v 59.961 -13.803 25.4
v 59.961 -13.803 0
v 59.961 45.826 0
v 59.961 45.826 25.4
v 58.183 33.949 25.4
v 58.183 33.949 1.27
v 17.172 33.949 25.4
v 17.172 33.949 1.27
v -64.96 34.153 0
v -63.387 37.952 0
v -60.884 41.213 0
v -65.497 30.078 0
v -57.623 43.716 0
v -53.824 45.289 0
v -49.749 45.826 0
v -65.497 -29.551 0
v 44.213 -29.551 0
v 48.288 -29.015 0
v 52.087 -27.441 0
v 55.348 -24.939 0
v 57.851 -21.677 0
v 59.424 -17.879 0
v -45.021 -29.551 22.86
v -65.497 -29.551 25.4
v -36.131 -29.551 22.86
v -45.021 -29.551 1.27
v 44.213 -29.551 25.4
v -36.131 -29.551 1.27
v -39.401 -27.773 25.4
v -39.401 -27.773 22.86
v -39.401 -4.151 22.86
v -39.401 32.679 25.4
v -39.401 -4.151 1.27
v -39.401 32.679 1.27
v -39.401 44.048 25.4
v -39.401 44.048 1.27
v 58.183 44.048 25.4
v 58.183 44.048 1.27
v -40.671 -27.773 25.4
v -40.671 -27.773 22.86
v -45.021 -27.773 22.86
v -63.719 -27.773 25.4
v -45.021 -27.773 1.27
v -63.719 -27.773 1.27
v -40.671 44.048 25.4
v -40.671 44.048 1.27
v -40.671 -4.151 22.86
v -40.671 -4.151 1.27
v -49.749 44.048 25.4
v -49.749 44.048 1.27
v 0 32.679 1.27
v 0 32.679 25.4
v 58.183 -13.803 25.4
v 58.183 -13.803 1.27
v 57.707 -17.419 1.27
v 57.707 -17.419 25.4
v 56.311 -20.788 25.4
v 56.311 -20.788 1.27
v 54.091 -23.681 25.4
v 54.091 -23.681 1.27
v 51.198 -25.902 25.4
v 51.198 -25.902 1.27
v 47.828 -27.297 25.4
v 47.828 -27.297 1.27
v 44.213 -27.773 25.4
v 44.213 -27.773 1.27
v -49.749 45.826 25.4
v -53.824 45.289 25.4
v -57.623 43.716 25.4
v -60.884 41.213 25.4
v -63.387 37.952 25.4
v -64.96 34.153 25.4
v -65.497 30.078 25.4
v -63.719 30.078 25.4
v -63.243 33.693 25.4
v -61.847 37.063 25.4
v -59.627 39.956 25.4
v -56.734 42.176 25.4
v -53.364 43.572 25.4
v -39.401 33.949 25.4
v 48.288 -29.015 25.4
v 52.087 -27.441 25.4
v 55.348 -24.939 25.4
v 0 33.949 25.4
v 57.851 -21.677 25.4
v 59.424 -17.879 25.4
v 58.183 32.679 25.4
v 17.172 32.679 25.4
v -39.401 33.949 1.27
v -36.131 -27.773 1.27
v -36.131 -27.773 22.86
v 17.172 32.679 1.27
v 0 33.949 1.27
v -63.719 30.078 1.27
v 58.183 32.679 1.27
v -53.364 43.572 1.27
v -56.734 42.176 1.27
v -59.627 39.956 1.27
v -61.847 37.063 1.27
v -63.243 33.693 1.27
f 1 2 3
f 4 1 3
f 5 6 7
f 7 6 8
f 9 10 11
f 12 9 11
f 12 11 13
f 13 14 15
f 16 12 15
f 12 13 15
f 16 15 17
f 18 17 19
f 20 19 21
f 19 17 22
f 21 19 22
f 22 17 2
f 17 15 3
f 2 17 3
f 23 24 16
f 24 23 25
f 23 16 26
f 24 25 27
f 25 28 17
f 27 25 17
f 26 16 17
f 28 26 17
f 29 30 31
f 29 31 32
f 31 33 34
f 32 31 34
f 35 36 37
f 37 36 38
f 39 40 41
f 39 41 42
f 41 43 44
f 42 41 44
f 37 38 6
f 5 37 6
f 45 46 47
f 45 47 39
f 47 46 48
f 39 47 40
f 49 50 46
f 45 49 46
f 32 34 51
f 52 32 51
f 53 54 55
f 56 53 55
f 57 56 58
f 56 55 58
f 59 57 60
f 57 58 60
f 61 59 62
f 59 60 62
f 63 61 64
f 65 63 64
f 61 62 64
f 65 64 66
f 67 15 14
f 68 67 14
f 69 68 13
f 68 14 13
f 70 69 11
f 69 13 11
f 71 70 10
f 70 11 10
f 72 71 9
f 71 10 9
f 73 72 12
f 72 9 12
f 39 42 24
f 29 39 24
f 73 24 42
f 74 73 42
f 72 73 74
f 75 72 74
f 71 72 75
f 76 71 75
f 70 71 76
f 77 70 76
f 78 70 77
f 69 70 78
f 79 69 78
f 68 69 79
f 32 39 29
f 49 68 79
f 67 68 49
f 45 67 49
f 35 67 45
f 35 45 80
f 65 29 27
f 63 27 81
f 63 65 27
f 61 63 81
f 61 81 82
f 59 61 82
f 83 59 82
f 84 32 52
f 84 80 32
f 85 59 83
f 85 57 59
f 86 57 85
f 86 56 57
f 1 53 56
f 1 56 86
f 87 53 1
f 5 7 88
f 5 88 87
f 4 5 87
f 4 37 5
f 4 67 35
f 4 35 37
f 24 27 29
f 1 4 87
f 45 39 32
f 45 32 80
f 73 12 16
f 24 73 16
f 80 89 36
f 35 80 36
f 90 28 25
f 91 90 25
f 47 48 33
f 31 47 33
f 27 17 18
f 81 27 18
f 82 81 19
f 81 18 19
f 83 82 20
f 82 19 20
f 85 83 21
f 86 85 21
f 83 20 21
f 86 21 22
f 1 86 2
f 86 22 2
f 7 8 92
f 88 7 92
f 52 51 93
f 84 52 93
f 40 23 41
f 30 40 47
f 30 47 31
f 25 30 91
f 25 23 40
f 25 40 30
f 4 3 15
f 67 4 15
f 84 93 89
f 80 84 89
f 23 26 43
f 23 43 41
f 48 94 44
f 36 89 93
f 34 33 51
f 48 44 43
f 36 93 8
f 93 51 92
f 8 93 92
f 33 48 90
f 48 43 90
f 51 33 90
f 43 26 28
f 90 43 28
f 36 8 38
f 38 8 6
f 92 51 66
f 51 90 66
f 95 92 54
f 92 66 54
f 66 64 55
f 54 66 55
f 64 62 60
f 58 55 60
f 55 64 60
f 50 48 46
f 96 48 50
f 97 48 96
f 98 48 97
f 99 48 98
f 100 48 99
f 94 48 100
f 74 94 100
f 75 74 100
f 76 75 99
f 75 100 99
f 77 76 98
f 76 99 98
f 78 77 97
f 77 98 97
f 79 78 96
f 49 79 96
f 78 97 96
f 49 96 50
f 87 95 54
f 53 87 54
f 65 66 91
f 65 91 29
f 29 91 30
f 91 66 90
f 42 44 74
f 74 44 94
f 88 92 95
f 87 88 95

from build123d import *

# Parameters (mm, degrees)
F1_DEPTH = 25.4
F2_DEPTH = 1.27
F3_W     = 8.89
F3_H     = 21.59
F4_DEPTH = 25.4


with BuildPart() as f1:
    # F0 (on Top) → F1 (new body)
    with BuildSketch(Plane.XY):
        with BuildLine():
            Line((59.960537, 45.825542), (-49.74861, 45.825542))
            ThreePointArc((-49.74861, 45.825542), (-60.884126, 41.21306), (-65.496609, 30.077543))
            Line((-65.496609, 30.077543), (-65.496609, -29.551196))
            Line((-65.496609, -29.551196), (44.212538, -29.551196))
            ThreePointArc((44.212538, -29.551196), (55.348055, -24.938714), (59.960537, -13.803197))
            Line((59.960537, -13.803197), (59.960537, 45.825542))
        make_face()
        with BuildLine():
            ThreePointArc((-63.71861, 30.077543), (-59.626891, 39.955824), (-49.74861, 44.047543))
            Line((-49.74861, 44.047543), (-40.670957, 44.047543))
            Line((-40.670957, 44.047543), (-40.670957, -27.773197))
            Line((-40.670957, -27.773197), (-63.71861, -27.773197))
            Line((-63.71861, -27.773197), (-63.71861, 30.077543))
        make_face(mode=Mode.SUBTRACT)
        with BuildLine():
            Line((-39.400957, 44.047543), (58.182538, 44.047543))
            Line((58.182538, 44.047543), (58.182538, 33.949472))
            Line((58.182538, 33.949472), (17.172182, 33.949472))
            Line((17.172182, 33.949472), (17.172182, 32.679472))
            Line((17.172182, 32.679472), (58.182538, 32.679472))
            Line((58.182538, 32.679472), (58.182538, -13.803197))
            ThreePointArc((58.182538, -13.803197), (54.090819, -23.681479), (44.212538, -27.773197))
            Line((44.212538, -27.773197), (-39.400957, -27.773197))
            Line((-39.400957, -27.773197), (-39.400957, 32.679472))
            Line((-39.400957, 32.679472), (0, 32.679472))
            Line((0, 32.679472), (0, 33.949472))
            Line((0, 33.949472), (-39.400957, 33.949472))
            Line((-39.400957, 33.949472), (-39.400957, 44.047543))
        make_face(mode=Mode.SUBTRACT)
    extrude(amount=F1_DEPTH)

    # F0 (on Top) → F2 (join)
    with BuildSketch(Plane.XY):
        with BuildLine():
            Line((-40.670957, 44.047543), (-49.74861, 44.047543))
            ThreePointArc((-49.74861, 44.047543), (-59.626891, 39.955824), (-63.71861, 30.077543))
            Line((-63.71861, 30.077543), (-63.71861, -27.773197))
            Line((-63.71861, -27.773197), (-40.670957, -27.773197))
            Line((-40.670957, -27.773197), (-40.670957, 44.047543))
        make_face()
        with BuildLine():
            Line((58.182538, 33.949472), (58.182538, 44.047543))
            Line((58.182538, 44.047543), (-39.400957, 44.047543))
            Line((-39.400957, 44.047543), (-39.400957, 33.949472))
            Line((-39.400957, 33.949472), (0, 33.949472))
            Line((0, 33.949472), (0, 32.679472))
            Line((0, 32.679472), (-39.400957, 32.679472))
            Line((-39.400957, 32.679472), (-39.400957, -27.773197))
            Line((-39.400957, -27.773197), (44.212538, -27.773197))
            ThreePointArc((44.212538, -27.773197), (54.090819, -23.681479), (58.182538, -13.803197))
            Line((58.182538, -13.803197), (58.182538, 32.679472))
            Line((58.182538, 32.679472), (17.172182, 32.679472))
            Line((17.172182, 32.679472), (17.172182, 33.949472))
            Line((17.172182, 33.949472), (58.182538, 33.949472))
        make_face()
    extrude(amount=F2_DEPTH)

    # F3 (on face) → F4 (cut)
    with BuildSketch(Plane.XZ.offset(29.551196)):
        with Locations((-40.575533, 12.065)):
            Rectangle(F3_W, F3_H)
    extrude(amount=-F4_DEPTH, mode=Mode.SUBTRACT)


solid = f1.part
